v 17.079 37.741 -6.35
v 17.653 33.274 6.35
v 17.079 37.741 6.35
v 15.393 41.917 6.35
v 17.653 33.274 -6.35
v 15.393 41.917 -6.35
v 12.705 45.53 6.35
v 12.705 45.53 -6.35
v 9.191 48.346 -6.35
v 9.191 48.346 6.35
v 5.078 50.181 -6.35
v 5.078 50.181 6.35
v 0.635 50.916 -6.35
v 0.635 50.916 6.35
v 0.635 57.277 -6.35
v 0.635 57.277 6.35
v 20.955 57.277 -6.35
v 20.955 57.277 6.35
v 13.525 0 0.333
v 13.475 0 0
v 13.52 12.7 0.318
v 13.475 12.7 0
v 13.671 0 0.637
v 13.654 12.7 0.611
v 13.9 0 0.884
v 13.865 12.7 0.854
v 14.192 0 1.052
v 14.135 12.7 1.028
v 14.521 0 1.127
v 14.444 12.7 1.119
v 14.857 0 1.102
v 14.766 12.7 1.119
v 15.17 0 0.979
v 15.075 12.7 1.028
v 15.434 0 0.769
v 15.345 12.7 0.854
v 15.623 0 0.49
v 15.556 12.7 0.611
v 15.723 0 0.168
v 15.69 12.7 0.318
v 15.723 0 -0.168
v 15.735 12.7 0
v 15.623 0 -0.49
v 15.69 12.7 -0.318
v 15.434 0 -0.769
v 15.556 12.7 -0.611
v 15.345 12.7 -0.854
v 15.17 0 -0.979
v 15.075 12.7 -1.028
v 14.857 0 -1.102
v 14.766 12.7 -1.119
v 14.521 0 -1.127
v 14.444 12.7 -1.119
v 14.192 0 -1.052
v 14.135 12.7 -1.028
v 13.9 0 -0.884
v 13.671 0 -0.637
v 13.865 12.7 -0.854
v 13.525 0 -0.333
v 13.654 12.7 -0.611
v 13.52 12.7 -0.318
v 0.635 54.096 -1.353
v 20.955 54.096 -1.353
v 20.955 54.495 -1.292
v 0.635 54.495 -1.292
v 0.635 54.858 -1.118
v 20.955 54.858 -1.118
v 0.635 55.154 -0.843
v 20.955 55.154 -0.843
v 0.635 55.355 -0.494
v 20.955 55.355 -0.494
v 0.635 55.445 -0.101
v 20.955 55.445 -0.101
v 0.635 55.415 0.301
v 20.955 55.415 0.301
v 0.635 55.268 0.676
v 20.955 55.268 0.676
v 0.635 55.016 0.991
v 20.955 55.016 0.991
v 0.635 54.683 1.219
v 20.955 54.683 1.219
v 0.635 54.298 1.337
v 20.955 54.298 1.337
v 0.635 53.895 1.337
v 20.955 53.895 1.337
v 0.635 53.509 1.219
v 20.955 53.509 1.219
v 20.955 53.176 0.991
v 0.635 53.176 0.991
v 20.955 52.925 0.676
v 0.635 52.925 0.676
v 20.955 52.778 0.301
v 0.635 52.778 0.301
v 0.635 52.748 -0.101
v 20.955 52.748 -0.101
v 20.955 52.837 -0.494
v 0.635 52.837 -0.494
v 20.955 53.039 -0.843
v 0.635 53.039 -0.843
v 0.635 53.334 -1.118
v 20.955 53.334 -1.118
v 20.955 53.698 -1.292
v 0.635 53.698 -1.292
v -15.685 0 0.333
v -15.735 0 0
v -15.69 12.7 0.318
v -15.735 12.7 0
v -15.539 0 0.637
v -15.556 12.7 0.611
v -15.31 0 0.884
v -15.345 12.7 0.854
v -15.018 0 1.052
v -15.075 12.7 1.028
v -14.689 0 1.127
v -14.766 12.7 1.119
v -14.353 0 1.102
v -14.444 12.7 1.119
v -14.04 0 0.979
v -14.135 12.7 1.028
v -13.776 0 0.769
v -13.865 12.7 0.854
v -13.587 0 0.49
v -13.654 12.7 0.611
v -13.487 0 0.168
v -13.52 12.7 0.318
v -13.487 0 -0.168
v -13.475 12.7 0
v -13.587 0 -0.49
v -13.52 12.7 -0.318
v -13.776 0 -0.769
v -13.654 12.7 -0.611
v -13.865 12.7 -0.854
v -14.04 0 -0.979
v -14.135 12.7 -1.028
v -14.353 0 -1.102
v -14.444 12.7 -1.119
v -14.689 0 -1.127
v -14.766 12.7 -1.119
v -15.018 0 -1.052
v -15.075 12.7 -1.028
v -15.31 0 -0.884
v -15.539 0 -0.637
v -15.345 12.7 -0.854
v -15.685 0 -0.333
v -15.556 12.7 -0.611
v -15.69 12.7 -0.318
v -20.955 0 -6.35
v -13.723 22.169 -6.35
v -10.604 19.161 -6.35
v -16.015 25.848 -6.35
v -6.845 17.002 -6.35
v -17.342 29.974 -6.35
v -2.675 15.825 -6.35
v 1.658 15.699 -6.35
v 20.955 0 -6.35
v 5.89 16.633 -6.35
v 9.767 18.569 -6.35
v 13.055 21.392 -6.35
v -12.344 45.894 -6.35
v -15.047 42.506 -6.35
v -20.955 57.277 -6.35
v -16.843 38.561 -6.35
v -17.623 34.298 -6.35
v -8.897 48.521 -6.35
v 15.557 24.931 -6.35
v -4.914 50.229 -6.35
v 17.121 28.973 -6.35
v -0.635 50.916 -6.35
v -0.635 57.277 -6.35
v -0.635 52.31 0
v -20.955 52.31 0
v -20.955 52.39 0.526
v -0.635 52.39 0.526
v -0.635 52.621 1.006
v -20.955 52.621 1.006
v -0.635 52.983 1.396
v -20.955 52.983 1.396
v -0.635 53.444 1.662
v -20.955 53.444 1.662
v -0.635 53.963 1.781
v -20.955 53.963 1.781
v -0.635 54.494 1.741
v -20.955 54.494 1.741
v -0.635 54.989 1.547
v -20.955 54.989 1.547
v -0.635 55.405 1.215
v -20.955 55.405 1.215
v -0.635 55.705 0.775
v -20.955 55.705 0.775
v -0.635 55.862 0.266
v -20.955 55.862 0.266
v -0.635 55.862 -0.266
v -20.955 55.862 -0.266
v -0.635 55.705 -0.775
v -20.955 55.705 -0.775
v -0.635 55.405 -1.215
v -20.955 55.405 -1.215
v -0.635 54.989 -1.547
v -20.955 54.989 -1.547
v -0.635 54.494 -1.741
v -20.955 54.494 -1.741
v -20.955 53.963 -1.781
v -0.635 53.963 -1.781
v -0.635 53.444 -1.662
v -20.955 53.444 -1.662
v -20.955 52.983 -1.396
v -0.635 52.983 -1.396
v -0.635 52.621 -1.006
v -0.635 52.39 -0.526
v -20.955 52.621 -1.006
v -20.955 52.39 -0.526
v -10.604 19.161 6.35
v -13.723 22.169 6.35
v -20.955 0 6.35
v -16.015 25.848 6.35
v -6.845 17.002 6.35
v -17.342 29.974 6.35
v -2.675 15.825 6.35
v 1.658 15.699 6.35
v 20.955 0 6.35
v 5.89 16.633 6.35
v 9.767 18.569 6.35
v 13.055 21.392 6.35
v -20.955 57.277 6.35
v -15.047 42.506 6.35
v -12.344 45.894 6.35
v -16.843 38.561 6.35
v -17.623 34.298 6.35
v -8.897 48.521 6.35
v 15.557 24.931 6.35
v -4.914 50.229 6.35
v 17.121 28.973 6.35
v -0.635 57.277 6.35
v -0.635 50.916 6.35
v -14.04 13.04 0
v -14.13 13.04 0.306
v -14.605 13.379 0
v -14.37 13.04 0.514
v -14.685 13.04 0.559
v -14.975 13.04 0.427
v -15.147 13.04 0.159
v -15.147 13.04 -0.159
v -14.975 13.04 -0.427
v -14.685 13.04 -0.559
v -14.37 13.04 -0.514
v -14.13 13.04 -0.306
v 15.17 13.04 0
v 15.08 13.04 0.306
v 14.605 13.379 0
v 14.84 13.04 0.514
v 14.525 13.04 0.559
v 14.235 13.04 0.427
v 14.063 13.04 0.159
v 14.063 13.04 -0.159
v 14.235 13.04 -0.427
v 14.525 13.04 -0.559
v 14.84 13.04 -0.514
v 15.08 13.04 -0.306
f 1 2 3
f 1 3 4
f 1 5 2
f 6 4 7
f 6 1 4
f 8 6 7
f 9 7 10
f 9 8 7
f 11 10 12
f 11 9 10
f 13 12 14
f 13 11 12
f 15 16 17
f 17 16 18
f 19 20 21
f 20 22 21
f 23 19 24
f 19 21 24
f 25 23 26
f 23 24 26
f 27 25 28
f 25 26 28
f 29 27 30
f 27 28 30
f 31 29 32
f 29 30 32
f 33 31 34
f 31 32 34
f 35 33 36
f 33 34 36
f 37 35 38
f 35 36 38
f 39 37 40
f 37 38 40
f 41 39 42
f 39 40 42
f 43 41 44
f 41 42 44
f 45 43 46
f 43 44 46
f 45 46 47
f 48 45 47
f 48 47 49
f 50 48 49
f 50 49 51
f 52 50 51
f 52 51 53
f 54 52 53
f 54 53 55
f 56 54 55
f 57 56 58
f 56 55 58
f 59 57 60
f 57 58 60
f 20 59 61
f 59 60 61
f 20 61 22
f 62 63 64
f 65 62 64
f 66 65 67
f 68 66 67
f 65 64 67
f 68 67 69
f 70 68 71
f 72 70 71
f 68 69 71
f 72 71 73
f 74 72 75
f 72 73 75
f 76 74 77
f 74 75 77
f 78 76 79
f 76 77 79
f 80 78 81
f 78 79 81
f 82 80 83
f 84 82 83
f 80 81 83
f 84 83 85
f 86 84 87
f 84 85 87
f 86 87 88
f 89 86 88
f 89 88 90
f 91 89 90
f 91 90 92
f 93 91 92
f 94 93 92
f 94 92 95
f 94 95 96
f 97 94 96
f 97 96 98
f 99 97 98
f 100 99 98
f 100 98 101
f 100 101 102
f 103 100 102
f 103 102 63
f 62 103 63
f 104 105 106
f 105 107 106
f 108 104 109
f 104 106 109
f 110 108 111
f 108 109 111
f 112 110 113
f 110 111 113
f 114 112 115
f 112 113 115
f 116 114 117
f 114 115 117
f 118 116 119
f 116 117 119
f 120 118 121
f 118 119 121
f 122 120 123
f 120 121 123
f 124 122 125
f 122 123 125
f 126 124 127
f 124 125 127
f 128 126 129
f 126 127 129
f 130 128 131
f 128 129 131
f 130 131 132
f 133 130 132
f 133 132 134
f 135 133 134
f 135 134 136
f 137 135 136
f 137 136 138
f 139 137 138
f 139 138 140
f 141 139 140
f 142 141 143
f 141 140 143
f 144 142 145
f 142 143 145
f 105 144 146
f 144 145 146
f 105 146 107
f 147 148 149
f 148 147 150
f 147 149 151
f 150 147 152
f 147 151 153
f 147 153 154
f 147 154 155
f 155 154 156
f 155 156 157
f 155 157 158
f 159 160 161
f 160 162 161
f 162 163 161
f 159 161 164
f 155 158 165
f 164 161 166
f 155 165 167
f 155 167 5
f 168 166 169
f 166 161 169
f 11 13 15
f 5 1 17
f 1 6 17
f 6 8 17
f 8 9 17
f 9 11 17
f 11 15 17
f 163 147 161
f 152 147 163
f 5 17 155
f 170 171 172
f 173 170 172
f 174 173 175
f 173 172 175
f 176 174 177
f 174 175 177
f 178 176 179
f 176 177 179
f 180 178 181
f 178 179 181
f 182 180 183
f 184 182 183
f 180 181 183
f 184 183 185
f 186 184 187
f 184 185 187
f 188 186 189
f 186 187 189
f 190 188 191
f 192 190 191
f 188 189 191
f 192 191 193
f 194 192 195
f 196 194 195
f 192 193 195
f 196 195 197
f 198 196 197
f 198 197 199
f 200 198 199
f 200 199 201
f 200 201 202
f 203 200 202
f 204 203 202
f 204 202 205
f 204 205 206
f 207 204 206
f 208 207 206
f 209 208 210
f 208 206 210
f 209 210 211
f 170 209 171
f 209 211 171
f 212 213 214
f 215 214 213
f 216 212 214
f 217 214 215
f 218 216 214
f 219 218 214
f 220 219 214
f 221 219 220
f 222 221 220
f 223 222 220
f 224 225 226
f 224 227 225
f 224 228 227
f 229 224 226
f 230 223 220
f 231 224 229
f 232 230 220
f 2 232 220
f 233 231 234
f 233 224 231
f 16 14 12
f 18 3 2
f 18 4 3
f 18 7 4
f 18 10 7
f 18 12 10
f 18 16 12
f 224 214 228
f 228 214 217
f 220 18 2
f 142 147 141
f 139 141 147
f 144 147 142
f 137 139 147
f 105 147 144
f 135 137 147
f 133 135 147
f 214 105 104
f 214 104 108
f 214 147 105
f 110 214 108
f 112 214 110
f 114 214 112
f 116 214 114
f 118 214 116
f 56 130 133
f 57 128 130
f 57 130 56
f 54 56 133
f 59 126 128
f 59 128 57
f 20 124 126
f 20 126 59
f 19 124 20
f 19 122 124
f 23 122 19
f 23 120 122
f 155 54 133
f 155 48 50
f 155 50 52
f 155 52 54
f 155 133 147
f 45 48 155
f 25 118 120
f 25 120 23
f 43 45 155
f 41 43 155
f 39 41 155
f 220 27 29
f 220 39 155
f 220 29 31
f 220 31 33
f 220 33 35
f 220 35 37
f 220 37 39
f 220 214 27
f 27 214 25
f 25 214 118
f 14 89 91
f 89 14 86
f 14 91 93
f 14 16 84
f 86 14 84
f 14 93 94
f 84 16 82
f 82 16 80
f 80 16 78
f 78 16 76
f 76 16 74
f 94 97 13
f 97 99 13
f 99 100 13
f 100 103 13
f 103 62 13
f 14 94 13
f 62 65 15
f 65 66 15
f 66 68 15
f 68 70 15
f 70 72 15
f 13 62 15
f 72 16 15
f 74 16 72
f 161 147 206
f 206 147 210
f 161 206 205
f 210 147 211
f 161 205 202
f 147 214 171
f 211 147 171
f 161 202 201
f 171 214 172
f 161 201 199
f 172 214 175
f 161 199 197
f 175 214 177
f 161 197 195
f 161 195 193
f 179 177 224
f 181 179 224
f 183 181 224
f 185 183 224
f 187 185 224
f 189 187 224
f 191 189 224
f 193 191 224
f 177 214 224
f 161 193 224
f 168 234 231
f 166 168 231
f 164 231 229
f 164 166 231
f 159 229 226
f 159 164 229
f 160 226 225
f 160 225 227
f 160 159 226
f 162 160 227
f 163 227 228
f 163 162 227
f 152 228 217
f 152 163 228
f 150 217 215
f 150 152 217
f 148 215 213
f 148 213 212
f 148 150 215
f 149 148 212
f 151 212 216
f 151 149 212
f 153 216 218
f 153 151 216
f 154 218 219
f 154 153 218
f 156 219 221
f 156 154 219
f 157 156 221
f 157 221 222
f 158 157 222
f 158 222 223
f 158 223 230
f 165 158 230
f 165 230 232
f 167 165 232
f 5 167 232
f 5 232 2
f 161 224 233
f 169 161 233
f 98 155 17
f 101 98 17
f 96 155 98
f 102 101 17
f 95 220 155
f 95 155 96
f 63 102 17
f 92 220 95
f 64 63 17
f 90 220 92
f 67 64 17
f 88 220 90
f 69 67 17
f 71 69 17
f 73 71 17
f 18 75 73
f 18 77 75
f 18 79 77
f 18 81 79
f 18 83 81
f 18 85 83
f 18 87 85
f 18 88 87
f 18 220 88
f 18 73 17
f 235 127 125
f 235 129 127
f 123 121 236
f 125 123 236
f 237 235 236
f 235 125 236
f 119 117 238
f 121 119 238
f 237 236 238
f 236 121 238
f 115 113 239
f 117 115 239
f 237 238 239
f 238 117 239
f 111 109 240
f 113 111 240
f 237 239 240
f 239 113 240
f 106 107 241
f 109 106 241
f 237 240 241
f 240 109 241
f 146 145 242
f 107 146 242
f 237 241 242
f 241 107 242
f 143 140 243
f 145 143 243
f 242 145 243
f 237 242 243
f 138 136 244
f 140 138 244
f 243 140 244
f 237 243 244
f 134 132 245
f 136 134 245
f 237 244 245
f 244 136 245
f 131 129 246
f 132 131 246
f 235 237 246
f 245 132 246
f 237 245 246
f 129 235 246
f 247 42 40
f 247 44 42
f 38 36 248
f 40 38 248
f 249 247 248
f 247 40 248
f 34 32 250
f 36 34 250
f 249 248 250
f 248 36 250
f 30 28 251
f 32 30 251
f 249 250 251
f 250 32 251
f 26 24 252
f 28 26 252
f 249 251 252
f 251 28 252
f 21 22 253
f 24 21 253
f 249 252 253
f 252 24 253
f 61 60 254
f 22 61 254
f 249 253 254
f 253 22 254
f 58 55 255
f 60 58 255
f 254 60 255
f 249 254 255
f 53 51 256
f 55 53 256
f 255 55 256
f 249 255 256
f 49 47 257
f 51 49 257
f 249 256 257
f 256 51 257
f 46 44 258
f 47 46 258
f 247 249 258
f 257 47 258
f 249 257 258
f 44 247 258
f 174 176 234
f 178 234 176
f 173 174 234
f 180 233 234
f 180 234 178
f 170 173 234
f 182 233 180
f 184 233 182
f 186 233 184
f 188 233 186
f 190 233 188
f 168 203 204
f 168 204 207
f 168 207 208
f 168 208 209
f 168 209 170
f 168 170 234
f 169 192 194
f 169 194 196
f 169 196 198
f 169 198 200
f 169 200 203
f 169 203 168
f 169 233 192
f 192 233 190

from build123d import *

# Parameters (mm, degrees)
SKETCH1_W                 = 41.91
SKETCH1_H                 = 57.277
SKETCH1_R                 = 17.653
BOSS_EXTRUDE1_DEPTH       = 6.35
CUT_EXTRUDE1_REACH        = 63.32
CUT_EXTRUDE1_END_RADIUS   = 17.653
SKETCH4_W                 = 1.27
SKETCH4_H                 = 12.7
SKETCH9_R                 = 1.7859375
CUT_EXTRUDE2_DEPTH        = 20.32
F_6_32_TAPPED_HOLE1_D     = 2.7051
F_4_40_TAPPED_HOLE3_D     = 2.2606
F_4_40_TAPPED_HOLE3_DEPTH = 12.7
F_4_40_TAPPED_HOLE3_TIP   = 0.679152758


with BuildPart() as part:
    # Sketch1 → Boss-Extrude1 (new, symmetric)
    with BuildSketch(Plane.XY):
        with Locations((0, 28.6385)):
            Rectangle(SKETCH1_W, SKETCH1_H)
        with Locations((0, 33.274)):
            Circle(SKETCH1_R, mode=Mode.SUBTRACT)
    extrude(amount=BOSS_EXTRUDE1_DEPTH, both=True)

    # Cut-Extrude1: up to this cylinder (the profile starts outside it)
    cut_extrude1_end = Plane(origin=(0, 33.274, 0), z_dir=(0, 0, -1)) * Cylinder(CUT_EXTRUDE1_END_RADIUS, 162.946, mode=Mode.PRIVATE)
    # Sketch4 → Cut-Extrude1 (cut, up to the surface)
    with BuildSketch(Plane(origin=(0, 57.277, 0), x_dir=(1, 0, 0), z_dir=(0, 1, 0)), mode=Mode.PRIVATE) as cut_extrude1_sk1:
        Rectangle(SKETCH4_W, SKETCH4_H)
    cut_extrude1_tool1 = extrude(cut_extrude1_sk1.sketch, amount=-CUT_EXTRUDE1_REACH, mode=Mode.PRIVATE) - cut_extrude1_end
    add(cut_extrude1_tool1.solids().sort_by_distance((0, 57.277, 0))[0], mode=Mode.SUBTRACT)

    # Sketch9 → Cut-Extrude2 (cut)
    with BuildSketch(Plane.ZY.offset(20.955)):
        with Locations(Location((0, 54.09628772, 0), (0, 0, 270))):
            Circle(SKETCH9_R)
    extrude(amount=-CUT_EXTRUDE2_DEPTH, mode=Mode.SUBTRACT)

    # #6-32 Tapped Hole1 (through all)
    with Locations(Plane.ZY.offset(-0.635)):
        with Locations((0, 54.09628772)):
            Hole(F_6_32_TAPPED_HOLE1_D / 2)

    # #4-40 Tapped Hole3
    with Locations(Plane.XZ):
        with Locations((-14.605, 0), (14.605, 0)):
            Hole(F_4_40_TAPPED_HOLE3_D / 2, depth=F_4_40_TAPPED_HOLE3_DEPTH)
            with Locations((0, 0, -(F_4_40_TAPPED_HOLE3_DEPTH + F_4_40_TAPPED_HOLE3_TIP / 2))):  # 118° drill point
                Cone(0, F_4_40_TAPPED_HOLE3_D / 2, F_4_40_TAPPED_HOLE3_TIP, mode=Mode.SUBTRACT)


solid = part.part
